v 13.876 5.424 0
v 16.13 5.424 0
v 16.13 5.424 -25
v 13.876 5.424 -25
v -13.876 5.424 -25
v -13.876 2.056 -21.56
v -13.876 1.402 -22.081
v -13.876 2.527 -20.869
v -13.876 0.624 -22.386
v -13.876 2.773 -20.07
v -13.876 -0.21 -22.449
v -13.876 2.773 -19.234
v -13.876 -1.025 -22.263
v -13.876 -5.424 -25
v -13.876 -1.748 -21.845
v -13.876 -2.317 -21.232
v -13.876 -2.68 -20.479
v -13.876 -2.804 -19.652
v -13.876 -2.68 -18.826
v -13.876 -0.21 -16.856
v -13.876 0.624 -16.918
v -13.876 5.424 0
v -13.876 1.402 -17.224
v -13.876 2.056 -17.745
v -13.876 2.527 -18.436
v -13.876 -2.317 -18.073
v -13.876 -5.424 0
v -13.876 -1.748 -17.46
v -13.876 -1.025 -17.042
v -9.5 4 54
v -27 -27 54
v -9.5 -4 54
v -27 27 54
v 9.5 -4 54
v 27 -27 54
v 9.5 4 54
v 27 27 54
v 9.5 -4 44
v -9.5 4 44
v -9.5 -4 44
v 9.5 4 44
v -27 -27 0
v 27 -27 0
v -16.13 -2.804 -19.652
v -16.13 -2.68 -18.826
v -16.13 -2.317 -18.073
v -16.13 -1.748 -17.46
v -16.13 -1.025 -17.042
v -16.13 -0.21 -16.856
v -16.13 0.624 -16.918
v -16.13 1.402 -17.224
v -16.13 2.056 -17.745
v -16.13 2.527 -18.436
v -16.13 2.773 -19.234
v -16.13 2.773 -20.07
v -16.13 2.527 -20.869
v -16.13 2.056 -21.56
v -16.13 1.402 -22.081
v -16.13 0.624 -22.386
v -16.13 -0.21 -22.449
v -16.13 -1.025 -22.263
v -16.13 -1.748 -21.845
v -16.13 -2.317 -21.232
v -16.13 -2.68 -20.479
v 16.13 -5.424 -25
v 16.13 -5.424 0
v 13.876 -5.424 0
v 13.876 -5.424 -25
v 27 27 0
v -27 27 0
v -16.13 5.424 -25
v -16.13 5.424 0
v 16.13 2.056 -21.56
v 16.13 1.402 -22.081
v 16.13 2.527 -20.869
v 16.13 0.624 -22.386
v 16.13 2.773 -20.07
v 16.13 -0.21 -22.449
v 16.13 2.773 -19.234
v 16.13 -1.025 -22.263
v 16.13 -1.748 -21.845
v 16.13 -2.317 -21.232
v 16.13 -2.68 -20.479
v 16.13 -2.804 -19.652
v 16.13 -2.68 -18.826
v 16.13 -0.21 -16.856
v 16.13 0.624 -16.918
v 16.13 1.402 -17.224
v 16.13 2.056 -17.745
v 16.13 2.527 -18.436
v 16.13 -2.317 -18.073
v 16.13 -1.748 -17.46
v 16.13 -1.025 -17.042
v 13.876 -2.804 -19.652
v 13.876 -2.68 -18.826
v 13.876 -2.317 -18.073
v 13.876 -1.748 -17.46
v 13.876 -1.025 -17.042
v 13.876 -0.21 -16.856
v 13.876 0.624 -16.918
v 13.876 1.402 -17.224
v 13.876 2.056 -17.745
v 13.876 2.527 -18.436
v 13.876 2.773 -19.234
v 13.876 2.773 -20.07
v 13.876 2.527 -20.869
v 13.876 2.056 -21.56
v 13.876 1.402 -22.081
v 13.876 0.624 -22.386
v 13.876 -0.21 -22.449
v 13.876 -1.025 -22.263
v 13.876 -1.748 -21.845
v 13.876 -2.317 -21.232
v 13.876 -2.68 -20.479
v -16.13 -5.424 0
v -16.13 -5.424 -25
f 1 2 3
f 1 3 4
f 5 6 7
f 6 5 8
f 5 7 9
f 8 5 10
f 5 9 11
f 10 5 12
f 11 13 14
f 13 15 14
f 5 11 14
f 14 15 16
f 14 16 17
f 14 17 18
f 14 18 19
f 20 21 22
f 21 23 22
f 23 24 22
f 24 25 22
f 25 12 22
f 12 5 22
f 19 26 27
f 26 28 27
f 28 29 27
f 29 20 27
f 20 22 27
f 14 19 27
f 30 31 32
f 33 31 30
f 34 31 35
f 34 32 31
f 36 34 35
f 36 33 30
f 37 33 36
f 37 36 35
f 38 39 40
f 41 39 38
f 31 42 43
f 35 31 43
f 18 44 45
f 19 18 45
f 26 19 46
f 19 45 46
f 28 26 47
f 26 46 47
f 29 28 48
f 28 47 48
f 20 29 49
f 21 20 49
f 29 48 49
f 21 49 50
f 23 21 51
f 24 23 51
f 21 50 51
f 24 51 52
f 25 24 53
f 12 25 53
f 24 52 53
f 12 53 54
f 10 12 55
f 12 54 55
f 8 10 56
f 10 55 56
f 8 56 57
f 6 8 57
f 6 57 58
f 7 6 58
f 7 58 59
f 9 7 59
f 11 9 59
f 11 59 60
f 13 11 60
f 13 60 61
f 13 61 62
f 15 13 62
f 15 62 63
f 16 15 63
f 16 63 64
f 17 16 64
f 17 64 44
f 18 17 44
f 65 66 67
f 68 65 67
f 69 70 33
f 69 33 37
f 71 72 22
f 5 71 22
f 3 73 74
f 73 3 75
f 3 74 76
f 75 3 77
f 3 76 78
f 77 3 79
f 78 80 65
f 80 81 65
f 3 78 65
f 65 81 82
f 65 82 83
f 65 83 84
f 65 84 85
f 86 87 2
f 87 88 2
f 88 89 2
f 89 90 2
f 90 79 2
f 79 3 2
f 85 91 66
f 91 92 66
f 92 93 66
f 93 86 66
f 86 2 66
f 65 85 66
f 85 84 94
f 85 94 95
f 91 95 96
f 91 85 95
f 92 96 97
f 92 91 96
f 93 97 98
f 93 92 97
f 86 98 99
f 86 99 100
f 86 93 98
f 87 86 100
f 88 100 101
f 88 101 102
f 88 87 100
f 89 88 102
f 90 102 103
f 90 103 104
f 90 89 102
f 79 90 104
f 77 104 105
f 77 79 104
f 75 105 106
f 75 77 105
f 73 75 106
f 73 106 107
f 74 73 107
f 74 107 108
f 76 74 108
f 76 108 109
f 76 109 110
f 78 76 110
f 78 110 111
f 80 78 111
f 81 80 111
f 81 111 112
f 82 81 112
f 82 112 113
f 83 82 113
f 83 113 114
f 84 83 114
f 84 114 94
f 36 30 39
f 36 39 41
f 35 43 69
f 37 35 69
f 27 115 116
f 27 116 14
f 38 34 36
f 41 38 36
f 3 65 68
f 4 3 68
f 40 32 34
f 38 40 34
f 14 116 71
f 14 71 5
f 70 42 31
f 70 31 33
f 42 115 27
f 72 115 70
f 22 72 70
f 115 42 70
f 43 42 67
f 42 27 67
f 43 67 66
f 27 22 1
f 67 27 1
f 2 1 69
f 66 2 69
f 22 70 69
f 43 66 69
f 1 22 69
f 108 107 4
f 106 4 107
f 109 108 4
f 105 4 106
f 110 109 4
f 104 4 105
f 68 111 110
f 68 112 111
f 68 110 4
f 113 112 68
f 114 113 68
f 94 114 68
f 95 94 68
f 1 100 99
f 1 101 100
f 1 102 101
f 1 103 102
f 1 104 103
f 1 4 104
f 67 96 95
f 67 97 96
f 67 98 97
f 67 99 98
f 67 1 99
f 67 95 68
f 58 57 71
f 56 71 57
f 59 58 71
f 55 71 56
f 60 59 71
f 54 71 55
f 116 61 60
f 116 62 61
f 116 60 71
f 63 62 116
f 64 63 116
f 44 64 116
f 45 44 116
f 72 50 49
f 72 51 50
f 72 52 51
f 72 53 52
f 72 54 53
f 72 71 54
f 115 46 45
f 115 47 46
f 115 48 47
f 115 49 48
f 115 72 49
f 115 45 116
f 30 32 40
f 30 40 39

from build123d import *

# Parameters (mm, degrees)
F0_W     = 54
F0_H     = 54
F1_DEPTH = 54
F2_W     = 19
F2_H     = 8
F3_DEPTH = 10
F4_W     = 2.25403
F4_H     = 10.847496
F5_DEPTH = 25
F6_R     = 2.804292
F7_DEPTH = 3


with BuildPart() as f1:
    # F0 (on Top) → F1 (new body)
    with BuildSketch(Plane.XY):
        Rectangle(F0_W, F0_H)
    extrude(amount=F1_DEPTH)

    # F2 (on face) → F3 (cut)
    with BuildSketch(Plane.XY.offset(54)):
        Rectangle(F2_W, F2_H)
    extrude(amount=-F3_DEPTH, mode=Mode.SUBTRACT)

    # F4 (on face) → F5 (join)
    with BuildSketch(Plane(origin=(0, 0, 0), x_dir=(1, 0, 0), z_dir=(0, 0, -1))):
        with Locations((-15.003354, 0)):
            Rectangle(F4_W, F4_H)
    extrude(amount=F5_DEPTH)

    # F6 (on face) → F7 (cut)
    with BuildSketch(Plane(origin=(-16.130369, 0, 0), x_dir=(0, -1, 0), z_dir=(-1, 0, 0))):
        with Locations((0, -19.652281)):
            Circle(F6_R)
    extrude(amount=-F7_DEPTH, mode=Mode.SUBTRACT)

    # F8: F1 across plane


with BuildPart() as f1_1:
    add(f1.part)
    add(f1.part.mirror(Plane.YZ))


solid = f1_1.part
